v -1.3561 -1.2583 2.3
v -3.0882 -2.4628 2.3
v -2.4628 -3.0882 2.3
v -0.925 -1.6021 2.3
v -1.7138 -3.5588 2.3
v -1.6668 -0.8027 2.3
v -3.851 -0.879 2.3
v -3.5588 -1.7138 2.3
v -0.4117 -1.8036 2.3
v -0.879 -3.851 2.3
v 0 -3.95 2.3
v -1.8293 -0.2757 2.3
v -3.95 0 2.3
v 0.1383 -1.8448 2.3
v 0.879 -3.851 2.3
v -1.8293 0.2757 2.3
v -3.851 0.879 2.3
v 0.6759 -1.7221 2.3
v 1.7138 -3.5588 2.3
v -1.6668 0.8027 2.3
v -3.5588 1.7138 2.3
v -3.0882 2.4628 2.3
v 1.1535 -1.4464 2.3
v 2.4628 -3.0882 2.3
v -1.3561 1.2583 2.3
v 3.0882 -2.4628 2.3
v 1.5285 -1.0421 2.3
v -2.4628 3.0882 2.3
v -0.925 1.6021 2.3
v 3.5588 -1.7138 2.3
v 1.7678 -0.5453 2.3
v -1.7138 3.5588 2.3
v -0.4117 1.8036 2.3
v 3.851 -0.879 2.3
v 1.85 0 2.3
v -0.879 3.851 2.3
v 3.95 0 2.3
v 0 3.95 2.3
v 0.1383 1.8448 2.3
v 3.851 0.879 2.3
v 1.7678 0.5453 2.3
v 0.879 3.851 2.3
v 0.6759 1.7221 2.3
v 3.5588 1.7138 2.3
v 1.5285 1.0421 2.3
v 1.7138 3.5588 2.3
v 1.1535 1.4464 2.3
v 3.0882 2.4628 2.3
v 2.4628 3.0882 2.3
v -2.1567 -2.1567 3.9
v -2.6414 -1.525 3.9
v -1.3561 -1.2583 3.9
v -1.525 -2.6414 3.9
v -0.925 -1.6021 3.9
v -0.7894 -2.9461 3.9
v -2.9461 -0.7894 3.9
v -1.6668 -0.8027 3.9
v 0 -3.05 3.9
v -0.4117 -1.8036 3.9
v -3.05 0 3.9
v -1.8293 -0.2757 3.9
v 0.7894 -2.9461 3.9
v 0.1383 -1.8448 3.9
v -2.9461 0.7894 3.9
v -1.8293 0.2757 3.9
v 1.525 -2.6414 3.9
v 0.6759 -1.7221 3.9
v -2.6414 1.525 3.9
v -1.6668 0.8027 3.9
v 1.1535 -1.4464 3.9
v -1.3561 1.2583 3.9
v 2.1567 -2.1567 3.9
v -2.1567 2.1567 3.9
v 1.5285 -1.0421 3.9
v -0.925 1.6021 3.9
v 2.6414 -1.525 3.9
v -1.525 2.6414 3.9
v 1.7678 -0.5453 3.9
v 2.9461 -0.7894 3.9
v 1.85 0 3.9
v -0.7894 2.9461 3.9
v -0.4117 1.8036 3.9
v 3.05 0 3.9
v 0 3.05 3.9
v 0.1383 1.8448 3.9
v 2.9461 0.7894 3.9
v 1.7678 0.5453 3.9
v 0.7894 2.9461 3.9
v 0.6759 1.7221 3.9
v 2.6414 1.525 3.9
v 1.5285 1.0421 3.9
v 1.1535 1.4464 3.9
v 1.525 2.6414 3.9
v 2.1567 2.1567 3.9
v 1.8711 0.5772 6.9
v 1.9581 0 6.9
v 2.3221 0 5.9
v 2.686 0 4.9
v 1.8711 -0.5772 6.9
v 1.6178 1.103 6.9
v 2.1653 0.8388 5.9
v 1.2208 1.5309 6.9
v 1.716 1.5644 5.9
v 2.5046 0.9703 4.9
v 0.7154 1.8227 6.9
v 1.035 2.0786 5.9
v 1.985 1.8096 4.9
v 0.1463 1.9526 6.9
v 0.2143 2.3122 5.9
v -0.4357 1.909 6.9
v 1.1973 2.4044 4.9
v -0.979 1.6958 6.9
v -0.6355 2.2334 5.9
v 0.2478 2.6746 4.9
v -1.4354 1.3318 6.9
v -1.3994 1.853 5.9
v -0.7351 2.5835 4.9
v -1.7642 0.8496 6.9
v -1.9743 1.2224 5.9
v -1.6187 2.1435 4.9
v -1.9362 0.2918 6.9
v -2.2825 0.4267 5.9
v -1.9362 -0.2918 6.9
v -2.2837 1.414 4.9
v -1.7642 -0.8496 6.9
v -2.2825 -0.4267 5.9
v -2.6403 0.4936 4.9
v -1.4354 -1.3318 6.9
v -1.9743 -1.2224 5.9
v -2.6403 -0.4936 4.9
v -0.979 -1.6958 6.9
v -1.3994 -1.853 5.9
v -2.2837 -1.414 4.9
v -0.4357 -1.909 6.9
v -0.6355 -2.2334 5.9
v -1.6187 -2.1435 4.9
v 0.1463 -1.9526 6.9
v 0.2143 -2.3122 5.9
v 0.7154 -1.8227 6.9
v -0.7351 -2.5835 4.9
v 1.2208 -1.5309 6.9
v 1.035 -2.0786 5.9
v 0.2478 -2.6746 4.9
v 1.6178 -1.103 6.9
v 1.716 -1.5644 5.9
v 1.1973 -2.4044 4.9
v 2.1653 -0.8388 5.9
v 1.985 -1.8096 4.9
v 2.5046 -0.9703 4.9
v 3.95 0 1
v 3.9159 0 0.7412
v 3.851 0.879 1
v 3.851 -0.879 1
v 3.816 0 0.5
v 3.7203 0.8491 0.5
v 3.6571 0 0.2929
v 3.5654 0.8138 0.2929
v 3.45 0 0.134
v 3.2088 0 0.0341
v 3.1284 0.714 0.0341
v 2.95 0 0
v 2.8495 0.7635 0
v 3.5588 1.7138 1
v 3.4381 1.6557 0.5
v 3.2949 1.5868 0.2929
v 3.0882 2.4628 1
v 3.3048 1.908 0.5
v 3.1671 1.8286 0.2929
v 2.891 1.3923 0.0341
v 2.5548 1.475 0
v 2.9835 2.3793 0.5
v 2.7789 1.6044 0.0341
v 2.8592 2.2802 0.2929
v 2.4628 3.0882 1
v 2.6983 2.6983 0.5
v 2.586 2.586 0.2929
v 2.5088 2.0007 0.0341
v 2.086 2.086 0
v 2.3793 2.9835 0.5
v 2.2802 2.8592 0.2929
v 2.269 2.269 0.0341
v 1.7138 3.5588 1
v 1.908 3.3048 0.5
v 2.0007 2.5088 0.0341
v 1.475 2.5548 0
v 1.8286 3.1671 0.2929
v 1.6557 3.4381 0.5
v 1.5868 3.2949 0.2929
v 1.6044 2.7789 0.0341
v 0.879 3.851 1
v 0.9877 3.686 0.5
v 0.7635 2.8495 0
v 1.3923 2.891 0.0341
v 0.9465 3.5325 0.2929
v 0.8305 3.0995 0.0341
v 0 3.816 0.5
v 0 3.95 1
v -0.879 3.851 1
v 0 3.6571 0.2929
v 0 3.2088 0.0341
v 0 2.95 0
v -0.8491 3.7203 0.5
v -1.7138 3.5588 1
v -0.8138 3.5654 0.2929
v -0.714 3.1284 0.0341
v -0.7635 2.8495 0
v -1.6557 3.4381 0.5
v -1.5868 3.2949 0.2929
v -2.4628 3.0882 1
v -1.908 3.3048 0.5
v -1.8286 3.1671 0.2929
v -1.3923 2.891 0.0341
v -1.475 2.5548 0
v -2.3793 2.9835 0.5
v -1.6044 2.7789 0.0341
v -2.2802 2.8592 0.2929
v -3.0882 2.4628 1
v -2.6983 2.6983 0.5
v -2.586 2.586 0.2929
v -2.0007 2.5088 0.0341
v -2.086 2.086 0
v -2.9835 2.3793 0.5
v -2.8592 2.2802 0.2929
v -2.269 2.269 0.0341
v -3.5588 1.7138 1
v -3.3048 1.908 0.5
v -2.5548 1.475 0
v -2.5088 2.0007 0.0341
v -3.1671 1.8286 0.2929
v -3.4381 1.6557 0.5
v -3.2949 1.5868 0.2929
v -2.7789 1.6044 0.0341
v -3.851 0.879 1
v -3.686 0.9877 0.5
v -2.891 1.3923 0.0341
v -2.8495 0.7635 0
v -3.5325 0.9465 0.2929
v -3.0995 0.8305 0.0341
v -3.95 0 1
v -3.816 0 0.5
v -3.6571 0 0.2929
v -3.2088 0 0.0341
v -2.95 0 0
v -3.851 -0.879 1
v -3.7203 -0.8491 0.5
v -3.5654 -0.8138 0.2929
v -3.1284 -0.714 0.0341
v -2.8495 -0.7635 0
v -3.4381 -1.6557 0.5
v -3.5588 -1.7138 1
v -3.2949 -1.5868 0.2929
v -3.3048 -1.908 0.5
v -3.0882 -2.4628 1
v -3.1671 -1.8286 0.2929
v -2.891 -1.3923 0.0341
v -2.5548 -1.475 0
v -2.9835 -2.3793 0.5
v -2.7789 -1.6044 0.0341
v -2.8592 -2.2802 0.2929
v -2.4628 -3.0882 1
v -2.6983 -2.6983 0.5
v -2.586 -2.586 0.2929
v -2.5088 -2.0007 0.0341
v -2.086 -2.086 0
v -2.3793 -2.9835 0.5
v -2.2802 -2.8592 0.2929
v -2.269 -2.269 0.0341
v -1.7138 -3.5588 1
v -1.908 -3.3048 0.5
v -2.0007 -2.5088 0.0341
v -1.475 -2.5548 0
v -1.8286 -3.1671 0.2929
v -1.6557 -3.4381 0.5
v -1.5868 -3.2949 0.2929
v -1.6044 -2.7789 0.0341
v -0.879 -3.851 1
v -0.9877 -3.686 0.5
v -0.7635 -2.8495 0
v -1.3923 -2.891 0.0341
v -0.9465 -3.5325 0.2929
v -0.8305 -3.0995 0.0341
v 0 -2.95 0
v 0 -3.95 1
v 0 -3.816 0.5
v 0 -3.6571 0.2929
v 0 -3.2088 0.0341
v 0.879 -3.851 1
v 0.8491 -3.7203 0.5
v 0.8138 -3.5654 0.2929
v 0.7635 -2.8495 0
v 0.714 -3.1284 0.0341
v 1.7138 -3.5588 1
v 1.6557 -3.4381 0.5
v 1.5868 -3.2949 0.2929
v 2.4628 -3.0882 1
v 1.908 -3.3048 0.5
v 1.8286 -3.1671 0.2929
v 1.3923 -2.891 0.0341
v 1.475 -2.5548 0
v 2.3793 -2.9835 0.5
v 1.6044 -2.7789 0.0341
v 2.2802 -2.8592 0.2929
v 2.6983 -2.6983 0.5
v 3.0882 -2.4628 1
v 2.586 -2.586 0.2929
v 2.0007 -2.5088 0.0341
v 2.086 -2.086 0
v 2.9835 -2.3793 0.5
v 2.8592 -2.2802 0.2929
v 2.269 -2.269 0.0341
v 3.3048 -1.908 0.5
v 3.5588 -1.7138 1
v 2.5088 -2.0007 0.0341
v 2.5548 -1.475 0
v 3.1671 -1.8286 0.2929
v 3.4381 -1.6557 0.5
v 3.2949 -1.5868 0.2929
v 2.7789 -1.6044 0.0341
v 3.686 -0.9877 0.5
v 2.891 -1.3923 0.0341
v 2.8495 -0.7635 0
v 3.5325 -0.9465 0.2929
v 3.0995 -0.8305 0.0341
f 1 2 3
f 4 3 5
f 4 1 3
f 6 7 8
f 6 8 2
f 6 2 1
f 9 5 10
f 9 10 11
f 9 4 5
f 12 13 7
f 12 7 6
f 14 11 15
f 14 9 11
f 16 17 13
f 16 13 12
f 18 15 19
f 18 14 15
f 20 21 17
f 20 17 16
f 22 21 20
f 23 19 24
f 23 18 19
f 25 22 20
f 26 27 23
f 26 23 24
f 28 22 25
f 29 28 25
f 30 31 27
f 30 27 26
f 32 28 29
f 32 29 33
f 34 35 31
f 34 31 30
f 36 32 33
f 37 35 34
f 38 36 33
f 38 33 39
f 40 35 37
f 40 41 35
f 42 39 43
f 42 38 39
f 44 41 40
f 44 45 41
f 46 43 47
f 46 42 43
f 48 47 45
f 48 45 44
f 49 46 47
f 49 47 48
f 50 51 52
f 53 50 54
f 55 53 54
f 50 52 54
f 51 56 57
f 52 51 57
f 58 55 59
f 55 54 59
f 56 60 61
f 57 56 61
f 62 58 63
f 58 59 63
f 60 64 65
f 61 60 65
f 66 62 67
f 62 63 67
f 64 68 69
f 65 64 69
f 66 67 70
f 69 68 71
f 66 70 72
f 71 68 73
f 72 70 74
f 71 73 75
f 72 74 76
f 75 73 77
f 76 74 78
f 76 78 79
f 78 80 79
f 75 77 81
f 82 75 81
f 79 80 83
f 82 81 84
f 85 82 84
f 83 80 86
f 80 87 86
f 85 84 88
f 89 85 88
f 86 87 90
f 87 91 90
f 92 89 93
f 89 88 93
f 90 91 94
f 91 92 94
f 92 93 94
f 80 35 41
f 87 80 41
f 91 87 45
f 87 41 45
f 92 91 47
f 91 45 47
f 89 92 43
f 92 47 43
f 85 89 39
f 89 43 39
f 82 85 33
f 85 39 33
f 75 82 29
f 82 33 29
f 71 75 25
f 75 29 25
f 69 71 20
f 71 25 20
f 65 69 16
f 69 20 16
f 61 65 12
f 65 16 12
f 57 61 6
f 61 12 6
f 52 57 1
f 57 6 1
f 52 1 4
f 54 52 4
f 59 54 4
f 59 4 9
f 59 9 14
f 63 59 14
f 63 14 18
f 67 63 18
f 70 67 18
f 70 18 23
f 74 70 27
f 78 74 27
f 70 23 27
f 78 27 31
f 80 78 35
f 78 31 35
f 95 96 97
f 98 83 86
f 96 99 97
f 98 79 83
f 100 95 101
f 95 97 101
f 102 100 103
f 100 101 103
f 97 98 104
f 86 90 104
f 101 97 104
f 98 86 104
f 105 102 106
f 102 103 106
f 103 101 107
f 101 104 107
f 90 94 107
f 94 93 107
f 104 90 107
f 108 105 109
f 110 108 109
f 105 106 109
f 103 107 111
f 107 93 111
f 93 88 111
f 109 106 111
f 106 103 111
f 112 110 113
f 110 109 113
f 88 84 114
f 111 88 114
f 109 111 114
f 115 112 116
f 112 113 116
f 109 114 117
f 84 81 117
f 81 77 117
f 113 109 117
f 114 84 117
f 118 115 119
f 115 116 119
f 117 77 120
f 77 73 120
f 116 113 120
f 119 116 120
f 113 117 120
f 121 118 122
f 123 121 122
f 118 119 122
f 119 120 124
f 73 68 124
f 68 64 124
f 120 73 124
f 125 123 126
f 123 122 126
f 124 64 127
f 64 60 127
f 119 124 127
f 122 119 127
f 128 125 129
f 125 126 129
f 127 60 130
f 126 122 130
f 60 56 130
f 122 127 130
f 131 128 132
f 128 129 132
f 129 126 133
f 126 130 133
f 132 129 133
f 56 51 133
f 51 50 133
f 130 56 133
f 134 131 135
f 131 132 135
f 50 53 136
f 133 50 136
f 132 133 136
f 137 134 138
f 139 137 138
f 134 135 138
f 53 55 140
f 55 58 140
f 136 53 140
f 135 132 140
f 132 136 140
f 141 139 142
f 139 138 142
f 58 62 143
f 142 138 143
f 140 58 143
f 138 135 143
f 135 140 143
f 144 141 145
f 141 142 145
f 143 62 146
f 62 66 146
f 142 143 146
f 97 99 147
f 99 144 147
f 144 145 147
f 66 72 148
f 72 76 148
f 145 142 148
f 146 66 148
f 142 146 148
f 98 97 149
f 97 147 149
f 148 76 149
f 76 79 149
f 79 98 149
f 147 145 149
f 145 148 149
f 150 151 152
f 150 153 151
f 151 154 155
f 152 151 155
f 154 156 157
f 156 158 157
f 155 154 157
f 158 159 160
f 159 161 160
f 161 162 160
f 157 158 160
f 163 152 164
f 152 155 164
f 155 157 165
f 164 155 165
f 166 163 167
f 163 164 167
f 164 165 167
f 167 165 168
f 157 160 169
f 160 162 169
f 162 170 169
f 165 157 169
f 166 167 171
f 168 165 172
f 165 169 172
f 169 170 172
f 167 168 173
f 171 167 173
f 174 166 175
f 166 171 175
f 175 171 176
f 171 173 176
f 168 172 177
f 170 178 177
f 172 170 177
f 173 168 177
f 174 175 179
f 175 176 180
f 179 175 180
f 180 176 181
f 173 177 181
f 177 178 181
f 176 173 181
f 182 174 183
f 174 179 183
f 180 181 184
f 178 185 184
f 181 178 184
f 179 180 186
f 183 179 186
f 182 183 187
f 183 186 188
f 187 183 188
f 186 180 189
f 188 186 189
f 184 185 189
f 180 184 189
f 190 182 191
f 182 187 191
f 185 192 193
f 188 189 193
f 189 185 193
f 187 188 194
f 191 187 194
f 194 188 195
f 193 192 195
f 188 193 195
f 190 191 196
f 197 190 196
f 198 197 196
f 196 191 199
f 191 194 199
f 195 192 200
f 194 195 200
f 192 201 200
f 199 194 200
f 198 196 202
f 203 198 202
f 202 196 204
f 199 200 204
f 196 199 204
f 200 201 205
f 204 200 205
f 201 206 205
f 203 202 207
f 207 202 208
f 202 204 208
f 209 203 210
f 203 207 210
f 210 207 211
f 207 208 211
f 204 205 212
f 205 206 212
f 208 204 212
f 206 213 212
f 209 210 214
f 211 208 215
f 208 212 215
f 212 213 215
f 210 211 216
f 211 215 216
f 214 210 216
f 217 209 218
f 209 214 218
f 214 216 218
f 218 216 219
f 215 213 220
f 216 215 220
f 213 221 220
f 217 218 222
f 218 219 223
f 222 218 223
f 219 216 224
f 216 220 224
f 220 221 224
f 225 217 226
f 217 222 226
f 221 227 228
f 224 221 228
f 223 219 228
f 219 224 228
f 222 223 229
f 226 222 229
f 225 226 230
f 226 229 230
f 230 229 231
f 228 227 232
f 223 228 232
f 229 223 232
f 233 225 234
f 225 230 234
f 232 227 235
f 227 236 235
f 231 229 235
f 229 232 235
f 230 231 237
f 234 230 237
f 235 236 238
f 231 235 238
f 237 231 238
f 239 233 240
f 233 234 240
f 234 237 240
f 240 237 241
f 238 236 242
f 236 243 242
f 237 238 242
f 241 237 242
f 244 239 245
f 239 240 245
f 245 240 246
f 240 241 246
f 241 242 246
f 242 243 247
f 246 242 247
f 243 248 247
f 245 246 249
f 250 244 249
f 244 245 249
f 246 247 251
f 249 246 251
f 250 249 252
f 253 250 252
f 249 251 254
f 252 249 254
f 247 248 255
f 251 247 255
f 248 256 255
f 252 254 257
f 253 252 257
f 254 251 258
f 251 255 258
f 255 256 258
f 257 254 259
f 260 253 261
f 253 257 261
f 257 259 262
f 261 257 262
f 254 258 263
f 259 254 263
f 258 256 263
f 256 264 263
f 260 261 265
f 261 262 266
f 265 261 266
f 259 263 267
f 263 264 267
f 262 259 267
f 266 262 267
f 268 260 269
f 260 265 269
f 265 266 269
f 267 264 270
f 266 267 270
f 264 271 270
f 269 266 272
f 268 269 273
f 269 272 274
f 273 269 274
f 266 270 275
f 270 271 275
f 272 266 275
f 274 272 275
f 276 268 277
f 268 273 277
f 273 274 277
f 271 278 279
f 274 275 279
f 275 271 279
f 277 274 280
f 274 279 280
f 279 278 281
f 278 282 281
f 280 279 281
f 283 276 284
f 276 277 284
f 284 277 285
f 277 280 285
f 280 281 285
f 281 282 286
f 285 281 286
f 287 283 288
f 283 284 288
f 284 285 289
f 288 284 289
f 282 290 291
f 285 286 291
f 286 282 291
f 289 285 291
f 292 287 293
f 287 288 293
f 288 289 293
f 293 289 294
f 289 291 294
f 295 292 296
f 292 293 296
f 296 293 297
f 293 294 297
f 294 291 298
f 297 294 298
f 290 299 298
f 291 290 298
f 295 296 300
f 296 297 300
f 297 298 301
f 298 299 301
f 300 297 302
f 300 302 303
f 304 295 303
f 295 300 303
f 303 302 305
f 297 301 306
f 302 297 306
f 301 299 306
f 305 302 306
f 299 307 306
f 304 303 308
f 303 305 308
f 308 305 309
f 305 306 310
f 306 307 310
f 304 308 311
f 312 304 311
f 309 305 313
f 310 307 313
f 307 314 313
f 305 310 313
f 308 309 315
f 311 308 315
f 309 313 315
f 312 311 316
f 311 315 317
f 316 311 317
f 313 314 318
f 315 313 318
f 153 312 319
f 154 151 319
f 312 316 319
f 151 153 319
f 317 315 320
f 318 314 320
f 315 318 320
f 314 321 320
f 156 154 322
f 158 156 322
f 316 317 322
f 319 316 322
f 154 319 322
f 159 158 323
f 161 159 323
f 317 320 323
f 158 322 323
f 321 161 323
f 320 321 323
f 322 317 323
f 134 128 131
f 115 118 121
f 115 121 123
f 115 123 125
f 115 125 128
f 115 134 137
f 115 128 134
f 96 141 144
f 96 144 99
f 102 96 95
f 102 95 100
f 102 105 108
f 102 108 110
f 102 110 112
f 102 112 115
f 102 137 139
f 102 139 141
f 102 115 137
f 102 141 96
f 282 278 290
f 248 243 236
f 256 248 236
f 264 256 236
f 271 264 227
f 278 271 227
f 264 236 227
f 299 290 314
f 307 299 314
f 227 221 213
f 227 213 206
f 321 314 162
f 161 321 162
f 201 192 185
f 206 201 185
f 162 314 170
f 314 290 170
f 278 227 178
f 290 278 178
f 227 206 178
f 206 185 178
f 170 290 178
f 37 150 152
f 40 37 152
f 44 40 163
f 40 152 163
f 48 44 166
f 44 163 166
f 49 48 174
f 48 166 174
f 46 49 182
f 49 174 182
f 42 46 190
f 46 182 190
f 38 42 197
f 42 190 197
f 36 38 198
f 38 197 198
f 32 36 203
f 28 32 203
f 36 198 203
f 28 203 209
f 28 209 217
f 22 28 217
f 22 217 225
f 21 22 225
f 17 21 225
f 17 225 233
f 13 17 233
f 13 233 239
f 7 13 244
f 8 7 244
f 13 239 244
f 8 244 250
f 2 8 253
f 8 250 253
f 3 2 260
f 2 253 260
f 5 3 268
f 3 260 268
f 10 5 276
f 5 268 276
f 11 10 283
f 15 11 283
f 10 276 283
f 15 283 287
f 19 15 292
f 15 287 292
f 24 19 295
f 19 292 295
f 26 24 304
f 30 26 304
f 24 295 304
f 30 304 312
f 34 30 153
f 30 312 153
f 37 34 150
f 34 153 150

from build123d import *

# Parameters (mm, degrees)
SKETCH_1_R      = 3.95
EXTRUDE_1_DEPTH = 2.3
SKETCH_2_R      = 1.85
EXTRUDE_2_DEPTH = 1.6
SKETCH_3_R      = 3.05
EXTRUDE_3_DEPTH = 3
DRAFT_7_ANGLE   = -20
FILLET_1_R      = 1


with BuildPart() as part:
    # 草图1 → 凸台-拉伸1 (new body)
    with BuildSketch(Plane.XY):
        Circle(SKETCH_1_R)
    extrude(amount=EXTRUDE_1_DEPTH)

    # 草图2 → 凸台-拉伸2 (add)
    with BuildSketch(Plane.XY.offset(2.3)):
        Circle(SKETCH_2_R)
    extrude(amount=EXTRUDE_2_DEPTH)

    # 草图3 → 凸台-拉伸3 (add)
    with BuildSketch(Plane.XY.offset(3.9)):
        Circle(SKETCH_3_R)
    extrude(amount=EXTRUDE_3_DEPTH)

    # 拔模7
    draft_7_faces = [part.faces().sort_by_distance(p)[0] for p in [
        (-3.05, 0, 5.4),
    ]]
    draft(draft_7_faces, Plane(origin=(0, 0, 3.9), x_dir=(-1, 0, 0), z_dir=(0, 0, -1)), DRAFT_7_ANGLE)

    # 圆角1
    fillet_1_edges = [part.edges().sort_by_distance(p)[0] for p in [
        (-3.95, 0, 0),
    ]]
    fillet(fillet_1_edges, radius=FILLET_1_R)


solid = part.part
